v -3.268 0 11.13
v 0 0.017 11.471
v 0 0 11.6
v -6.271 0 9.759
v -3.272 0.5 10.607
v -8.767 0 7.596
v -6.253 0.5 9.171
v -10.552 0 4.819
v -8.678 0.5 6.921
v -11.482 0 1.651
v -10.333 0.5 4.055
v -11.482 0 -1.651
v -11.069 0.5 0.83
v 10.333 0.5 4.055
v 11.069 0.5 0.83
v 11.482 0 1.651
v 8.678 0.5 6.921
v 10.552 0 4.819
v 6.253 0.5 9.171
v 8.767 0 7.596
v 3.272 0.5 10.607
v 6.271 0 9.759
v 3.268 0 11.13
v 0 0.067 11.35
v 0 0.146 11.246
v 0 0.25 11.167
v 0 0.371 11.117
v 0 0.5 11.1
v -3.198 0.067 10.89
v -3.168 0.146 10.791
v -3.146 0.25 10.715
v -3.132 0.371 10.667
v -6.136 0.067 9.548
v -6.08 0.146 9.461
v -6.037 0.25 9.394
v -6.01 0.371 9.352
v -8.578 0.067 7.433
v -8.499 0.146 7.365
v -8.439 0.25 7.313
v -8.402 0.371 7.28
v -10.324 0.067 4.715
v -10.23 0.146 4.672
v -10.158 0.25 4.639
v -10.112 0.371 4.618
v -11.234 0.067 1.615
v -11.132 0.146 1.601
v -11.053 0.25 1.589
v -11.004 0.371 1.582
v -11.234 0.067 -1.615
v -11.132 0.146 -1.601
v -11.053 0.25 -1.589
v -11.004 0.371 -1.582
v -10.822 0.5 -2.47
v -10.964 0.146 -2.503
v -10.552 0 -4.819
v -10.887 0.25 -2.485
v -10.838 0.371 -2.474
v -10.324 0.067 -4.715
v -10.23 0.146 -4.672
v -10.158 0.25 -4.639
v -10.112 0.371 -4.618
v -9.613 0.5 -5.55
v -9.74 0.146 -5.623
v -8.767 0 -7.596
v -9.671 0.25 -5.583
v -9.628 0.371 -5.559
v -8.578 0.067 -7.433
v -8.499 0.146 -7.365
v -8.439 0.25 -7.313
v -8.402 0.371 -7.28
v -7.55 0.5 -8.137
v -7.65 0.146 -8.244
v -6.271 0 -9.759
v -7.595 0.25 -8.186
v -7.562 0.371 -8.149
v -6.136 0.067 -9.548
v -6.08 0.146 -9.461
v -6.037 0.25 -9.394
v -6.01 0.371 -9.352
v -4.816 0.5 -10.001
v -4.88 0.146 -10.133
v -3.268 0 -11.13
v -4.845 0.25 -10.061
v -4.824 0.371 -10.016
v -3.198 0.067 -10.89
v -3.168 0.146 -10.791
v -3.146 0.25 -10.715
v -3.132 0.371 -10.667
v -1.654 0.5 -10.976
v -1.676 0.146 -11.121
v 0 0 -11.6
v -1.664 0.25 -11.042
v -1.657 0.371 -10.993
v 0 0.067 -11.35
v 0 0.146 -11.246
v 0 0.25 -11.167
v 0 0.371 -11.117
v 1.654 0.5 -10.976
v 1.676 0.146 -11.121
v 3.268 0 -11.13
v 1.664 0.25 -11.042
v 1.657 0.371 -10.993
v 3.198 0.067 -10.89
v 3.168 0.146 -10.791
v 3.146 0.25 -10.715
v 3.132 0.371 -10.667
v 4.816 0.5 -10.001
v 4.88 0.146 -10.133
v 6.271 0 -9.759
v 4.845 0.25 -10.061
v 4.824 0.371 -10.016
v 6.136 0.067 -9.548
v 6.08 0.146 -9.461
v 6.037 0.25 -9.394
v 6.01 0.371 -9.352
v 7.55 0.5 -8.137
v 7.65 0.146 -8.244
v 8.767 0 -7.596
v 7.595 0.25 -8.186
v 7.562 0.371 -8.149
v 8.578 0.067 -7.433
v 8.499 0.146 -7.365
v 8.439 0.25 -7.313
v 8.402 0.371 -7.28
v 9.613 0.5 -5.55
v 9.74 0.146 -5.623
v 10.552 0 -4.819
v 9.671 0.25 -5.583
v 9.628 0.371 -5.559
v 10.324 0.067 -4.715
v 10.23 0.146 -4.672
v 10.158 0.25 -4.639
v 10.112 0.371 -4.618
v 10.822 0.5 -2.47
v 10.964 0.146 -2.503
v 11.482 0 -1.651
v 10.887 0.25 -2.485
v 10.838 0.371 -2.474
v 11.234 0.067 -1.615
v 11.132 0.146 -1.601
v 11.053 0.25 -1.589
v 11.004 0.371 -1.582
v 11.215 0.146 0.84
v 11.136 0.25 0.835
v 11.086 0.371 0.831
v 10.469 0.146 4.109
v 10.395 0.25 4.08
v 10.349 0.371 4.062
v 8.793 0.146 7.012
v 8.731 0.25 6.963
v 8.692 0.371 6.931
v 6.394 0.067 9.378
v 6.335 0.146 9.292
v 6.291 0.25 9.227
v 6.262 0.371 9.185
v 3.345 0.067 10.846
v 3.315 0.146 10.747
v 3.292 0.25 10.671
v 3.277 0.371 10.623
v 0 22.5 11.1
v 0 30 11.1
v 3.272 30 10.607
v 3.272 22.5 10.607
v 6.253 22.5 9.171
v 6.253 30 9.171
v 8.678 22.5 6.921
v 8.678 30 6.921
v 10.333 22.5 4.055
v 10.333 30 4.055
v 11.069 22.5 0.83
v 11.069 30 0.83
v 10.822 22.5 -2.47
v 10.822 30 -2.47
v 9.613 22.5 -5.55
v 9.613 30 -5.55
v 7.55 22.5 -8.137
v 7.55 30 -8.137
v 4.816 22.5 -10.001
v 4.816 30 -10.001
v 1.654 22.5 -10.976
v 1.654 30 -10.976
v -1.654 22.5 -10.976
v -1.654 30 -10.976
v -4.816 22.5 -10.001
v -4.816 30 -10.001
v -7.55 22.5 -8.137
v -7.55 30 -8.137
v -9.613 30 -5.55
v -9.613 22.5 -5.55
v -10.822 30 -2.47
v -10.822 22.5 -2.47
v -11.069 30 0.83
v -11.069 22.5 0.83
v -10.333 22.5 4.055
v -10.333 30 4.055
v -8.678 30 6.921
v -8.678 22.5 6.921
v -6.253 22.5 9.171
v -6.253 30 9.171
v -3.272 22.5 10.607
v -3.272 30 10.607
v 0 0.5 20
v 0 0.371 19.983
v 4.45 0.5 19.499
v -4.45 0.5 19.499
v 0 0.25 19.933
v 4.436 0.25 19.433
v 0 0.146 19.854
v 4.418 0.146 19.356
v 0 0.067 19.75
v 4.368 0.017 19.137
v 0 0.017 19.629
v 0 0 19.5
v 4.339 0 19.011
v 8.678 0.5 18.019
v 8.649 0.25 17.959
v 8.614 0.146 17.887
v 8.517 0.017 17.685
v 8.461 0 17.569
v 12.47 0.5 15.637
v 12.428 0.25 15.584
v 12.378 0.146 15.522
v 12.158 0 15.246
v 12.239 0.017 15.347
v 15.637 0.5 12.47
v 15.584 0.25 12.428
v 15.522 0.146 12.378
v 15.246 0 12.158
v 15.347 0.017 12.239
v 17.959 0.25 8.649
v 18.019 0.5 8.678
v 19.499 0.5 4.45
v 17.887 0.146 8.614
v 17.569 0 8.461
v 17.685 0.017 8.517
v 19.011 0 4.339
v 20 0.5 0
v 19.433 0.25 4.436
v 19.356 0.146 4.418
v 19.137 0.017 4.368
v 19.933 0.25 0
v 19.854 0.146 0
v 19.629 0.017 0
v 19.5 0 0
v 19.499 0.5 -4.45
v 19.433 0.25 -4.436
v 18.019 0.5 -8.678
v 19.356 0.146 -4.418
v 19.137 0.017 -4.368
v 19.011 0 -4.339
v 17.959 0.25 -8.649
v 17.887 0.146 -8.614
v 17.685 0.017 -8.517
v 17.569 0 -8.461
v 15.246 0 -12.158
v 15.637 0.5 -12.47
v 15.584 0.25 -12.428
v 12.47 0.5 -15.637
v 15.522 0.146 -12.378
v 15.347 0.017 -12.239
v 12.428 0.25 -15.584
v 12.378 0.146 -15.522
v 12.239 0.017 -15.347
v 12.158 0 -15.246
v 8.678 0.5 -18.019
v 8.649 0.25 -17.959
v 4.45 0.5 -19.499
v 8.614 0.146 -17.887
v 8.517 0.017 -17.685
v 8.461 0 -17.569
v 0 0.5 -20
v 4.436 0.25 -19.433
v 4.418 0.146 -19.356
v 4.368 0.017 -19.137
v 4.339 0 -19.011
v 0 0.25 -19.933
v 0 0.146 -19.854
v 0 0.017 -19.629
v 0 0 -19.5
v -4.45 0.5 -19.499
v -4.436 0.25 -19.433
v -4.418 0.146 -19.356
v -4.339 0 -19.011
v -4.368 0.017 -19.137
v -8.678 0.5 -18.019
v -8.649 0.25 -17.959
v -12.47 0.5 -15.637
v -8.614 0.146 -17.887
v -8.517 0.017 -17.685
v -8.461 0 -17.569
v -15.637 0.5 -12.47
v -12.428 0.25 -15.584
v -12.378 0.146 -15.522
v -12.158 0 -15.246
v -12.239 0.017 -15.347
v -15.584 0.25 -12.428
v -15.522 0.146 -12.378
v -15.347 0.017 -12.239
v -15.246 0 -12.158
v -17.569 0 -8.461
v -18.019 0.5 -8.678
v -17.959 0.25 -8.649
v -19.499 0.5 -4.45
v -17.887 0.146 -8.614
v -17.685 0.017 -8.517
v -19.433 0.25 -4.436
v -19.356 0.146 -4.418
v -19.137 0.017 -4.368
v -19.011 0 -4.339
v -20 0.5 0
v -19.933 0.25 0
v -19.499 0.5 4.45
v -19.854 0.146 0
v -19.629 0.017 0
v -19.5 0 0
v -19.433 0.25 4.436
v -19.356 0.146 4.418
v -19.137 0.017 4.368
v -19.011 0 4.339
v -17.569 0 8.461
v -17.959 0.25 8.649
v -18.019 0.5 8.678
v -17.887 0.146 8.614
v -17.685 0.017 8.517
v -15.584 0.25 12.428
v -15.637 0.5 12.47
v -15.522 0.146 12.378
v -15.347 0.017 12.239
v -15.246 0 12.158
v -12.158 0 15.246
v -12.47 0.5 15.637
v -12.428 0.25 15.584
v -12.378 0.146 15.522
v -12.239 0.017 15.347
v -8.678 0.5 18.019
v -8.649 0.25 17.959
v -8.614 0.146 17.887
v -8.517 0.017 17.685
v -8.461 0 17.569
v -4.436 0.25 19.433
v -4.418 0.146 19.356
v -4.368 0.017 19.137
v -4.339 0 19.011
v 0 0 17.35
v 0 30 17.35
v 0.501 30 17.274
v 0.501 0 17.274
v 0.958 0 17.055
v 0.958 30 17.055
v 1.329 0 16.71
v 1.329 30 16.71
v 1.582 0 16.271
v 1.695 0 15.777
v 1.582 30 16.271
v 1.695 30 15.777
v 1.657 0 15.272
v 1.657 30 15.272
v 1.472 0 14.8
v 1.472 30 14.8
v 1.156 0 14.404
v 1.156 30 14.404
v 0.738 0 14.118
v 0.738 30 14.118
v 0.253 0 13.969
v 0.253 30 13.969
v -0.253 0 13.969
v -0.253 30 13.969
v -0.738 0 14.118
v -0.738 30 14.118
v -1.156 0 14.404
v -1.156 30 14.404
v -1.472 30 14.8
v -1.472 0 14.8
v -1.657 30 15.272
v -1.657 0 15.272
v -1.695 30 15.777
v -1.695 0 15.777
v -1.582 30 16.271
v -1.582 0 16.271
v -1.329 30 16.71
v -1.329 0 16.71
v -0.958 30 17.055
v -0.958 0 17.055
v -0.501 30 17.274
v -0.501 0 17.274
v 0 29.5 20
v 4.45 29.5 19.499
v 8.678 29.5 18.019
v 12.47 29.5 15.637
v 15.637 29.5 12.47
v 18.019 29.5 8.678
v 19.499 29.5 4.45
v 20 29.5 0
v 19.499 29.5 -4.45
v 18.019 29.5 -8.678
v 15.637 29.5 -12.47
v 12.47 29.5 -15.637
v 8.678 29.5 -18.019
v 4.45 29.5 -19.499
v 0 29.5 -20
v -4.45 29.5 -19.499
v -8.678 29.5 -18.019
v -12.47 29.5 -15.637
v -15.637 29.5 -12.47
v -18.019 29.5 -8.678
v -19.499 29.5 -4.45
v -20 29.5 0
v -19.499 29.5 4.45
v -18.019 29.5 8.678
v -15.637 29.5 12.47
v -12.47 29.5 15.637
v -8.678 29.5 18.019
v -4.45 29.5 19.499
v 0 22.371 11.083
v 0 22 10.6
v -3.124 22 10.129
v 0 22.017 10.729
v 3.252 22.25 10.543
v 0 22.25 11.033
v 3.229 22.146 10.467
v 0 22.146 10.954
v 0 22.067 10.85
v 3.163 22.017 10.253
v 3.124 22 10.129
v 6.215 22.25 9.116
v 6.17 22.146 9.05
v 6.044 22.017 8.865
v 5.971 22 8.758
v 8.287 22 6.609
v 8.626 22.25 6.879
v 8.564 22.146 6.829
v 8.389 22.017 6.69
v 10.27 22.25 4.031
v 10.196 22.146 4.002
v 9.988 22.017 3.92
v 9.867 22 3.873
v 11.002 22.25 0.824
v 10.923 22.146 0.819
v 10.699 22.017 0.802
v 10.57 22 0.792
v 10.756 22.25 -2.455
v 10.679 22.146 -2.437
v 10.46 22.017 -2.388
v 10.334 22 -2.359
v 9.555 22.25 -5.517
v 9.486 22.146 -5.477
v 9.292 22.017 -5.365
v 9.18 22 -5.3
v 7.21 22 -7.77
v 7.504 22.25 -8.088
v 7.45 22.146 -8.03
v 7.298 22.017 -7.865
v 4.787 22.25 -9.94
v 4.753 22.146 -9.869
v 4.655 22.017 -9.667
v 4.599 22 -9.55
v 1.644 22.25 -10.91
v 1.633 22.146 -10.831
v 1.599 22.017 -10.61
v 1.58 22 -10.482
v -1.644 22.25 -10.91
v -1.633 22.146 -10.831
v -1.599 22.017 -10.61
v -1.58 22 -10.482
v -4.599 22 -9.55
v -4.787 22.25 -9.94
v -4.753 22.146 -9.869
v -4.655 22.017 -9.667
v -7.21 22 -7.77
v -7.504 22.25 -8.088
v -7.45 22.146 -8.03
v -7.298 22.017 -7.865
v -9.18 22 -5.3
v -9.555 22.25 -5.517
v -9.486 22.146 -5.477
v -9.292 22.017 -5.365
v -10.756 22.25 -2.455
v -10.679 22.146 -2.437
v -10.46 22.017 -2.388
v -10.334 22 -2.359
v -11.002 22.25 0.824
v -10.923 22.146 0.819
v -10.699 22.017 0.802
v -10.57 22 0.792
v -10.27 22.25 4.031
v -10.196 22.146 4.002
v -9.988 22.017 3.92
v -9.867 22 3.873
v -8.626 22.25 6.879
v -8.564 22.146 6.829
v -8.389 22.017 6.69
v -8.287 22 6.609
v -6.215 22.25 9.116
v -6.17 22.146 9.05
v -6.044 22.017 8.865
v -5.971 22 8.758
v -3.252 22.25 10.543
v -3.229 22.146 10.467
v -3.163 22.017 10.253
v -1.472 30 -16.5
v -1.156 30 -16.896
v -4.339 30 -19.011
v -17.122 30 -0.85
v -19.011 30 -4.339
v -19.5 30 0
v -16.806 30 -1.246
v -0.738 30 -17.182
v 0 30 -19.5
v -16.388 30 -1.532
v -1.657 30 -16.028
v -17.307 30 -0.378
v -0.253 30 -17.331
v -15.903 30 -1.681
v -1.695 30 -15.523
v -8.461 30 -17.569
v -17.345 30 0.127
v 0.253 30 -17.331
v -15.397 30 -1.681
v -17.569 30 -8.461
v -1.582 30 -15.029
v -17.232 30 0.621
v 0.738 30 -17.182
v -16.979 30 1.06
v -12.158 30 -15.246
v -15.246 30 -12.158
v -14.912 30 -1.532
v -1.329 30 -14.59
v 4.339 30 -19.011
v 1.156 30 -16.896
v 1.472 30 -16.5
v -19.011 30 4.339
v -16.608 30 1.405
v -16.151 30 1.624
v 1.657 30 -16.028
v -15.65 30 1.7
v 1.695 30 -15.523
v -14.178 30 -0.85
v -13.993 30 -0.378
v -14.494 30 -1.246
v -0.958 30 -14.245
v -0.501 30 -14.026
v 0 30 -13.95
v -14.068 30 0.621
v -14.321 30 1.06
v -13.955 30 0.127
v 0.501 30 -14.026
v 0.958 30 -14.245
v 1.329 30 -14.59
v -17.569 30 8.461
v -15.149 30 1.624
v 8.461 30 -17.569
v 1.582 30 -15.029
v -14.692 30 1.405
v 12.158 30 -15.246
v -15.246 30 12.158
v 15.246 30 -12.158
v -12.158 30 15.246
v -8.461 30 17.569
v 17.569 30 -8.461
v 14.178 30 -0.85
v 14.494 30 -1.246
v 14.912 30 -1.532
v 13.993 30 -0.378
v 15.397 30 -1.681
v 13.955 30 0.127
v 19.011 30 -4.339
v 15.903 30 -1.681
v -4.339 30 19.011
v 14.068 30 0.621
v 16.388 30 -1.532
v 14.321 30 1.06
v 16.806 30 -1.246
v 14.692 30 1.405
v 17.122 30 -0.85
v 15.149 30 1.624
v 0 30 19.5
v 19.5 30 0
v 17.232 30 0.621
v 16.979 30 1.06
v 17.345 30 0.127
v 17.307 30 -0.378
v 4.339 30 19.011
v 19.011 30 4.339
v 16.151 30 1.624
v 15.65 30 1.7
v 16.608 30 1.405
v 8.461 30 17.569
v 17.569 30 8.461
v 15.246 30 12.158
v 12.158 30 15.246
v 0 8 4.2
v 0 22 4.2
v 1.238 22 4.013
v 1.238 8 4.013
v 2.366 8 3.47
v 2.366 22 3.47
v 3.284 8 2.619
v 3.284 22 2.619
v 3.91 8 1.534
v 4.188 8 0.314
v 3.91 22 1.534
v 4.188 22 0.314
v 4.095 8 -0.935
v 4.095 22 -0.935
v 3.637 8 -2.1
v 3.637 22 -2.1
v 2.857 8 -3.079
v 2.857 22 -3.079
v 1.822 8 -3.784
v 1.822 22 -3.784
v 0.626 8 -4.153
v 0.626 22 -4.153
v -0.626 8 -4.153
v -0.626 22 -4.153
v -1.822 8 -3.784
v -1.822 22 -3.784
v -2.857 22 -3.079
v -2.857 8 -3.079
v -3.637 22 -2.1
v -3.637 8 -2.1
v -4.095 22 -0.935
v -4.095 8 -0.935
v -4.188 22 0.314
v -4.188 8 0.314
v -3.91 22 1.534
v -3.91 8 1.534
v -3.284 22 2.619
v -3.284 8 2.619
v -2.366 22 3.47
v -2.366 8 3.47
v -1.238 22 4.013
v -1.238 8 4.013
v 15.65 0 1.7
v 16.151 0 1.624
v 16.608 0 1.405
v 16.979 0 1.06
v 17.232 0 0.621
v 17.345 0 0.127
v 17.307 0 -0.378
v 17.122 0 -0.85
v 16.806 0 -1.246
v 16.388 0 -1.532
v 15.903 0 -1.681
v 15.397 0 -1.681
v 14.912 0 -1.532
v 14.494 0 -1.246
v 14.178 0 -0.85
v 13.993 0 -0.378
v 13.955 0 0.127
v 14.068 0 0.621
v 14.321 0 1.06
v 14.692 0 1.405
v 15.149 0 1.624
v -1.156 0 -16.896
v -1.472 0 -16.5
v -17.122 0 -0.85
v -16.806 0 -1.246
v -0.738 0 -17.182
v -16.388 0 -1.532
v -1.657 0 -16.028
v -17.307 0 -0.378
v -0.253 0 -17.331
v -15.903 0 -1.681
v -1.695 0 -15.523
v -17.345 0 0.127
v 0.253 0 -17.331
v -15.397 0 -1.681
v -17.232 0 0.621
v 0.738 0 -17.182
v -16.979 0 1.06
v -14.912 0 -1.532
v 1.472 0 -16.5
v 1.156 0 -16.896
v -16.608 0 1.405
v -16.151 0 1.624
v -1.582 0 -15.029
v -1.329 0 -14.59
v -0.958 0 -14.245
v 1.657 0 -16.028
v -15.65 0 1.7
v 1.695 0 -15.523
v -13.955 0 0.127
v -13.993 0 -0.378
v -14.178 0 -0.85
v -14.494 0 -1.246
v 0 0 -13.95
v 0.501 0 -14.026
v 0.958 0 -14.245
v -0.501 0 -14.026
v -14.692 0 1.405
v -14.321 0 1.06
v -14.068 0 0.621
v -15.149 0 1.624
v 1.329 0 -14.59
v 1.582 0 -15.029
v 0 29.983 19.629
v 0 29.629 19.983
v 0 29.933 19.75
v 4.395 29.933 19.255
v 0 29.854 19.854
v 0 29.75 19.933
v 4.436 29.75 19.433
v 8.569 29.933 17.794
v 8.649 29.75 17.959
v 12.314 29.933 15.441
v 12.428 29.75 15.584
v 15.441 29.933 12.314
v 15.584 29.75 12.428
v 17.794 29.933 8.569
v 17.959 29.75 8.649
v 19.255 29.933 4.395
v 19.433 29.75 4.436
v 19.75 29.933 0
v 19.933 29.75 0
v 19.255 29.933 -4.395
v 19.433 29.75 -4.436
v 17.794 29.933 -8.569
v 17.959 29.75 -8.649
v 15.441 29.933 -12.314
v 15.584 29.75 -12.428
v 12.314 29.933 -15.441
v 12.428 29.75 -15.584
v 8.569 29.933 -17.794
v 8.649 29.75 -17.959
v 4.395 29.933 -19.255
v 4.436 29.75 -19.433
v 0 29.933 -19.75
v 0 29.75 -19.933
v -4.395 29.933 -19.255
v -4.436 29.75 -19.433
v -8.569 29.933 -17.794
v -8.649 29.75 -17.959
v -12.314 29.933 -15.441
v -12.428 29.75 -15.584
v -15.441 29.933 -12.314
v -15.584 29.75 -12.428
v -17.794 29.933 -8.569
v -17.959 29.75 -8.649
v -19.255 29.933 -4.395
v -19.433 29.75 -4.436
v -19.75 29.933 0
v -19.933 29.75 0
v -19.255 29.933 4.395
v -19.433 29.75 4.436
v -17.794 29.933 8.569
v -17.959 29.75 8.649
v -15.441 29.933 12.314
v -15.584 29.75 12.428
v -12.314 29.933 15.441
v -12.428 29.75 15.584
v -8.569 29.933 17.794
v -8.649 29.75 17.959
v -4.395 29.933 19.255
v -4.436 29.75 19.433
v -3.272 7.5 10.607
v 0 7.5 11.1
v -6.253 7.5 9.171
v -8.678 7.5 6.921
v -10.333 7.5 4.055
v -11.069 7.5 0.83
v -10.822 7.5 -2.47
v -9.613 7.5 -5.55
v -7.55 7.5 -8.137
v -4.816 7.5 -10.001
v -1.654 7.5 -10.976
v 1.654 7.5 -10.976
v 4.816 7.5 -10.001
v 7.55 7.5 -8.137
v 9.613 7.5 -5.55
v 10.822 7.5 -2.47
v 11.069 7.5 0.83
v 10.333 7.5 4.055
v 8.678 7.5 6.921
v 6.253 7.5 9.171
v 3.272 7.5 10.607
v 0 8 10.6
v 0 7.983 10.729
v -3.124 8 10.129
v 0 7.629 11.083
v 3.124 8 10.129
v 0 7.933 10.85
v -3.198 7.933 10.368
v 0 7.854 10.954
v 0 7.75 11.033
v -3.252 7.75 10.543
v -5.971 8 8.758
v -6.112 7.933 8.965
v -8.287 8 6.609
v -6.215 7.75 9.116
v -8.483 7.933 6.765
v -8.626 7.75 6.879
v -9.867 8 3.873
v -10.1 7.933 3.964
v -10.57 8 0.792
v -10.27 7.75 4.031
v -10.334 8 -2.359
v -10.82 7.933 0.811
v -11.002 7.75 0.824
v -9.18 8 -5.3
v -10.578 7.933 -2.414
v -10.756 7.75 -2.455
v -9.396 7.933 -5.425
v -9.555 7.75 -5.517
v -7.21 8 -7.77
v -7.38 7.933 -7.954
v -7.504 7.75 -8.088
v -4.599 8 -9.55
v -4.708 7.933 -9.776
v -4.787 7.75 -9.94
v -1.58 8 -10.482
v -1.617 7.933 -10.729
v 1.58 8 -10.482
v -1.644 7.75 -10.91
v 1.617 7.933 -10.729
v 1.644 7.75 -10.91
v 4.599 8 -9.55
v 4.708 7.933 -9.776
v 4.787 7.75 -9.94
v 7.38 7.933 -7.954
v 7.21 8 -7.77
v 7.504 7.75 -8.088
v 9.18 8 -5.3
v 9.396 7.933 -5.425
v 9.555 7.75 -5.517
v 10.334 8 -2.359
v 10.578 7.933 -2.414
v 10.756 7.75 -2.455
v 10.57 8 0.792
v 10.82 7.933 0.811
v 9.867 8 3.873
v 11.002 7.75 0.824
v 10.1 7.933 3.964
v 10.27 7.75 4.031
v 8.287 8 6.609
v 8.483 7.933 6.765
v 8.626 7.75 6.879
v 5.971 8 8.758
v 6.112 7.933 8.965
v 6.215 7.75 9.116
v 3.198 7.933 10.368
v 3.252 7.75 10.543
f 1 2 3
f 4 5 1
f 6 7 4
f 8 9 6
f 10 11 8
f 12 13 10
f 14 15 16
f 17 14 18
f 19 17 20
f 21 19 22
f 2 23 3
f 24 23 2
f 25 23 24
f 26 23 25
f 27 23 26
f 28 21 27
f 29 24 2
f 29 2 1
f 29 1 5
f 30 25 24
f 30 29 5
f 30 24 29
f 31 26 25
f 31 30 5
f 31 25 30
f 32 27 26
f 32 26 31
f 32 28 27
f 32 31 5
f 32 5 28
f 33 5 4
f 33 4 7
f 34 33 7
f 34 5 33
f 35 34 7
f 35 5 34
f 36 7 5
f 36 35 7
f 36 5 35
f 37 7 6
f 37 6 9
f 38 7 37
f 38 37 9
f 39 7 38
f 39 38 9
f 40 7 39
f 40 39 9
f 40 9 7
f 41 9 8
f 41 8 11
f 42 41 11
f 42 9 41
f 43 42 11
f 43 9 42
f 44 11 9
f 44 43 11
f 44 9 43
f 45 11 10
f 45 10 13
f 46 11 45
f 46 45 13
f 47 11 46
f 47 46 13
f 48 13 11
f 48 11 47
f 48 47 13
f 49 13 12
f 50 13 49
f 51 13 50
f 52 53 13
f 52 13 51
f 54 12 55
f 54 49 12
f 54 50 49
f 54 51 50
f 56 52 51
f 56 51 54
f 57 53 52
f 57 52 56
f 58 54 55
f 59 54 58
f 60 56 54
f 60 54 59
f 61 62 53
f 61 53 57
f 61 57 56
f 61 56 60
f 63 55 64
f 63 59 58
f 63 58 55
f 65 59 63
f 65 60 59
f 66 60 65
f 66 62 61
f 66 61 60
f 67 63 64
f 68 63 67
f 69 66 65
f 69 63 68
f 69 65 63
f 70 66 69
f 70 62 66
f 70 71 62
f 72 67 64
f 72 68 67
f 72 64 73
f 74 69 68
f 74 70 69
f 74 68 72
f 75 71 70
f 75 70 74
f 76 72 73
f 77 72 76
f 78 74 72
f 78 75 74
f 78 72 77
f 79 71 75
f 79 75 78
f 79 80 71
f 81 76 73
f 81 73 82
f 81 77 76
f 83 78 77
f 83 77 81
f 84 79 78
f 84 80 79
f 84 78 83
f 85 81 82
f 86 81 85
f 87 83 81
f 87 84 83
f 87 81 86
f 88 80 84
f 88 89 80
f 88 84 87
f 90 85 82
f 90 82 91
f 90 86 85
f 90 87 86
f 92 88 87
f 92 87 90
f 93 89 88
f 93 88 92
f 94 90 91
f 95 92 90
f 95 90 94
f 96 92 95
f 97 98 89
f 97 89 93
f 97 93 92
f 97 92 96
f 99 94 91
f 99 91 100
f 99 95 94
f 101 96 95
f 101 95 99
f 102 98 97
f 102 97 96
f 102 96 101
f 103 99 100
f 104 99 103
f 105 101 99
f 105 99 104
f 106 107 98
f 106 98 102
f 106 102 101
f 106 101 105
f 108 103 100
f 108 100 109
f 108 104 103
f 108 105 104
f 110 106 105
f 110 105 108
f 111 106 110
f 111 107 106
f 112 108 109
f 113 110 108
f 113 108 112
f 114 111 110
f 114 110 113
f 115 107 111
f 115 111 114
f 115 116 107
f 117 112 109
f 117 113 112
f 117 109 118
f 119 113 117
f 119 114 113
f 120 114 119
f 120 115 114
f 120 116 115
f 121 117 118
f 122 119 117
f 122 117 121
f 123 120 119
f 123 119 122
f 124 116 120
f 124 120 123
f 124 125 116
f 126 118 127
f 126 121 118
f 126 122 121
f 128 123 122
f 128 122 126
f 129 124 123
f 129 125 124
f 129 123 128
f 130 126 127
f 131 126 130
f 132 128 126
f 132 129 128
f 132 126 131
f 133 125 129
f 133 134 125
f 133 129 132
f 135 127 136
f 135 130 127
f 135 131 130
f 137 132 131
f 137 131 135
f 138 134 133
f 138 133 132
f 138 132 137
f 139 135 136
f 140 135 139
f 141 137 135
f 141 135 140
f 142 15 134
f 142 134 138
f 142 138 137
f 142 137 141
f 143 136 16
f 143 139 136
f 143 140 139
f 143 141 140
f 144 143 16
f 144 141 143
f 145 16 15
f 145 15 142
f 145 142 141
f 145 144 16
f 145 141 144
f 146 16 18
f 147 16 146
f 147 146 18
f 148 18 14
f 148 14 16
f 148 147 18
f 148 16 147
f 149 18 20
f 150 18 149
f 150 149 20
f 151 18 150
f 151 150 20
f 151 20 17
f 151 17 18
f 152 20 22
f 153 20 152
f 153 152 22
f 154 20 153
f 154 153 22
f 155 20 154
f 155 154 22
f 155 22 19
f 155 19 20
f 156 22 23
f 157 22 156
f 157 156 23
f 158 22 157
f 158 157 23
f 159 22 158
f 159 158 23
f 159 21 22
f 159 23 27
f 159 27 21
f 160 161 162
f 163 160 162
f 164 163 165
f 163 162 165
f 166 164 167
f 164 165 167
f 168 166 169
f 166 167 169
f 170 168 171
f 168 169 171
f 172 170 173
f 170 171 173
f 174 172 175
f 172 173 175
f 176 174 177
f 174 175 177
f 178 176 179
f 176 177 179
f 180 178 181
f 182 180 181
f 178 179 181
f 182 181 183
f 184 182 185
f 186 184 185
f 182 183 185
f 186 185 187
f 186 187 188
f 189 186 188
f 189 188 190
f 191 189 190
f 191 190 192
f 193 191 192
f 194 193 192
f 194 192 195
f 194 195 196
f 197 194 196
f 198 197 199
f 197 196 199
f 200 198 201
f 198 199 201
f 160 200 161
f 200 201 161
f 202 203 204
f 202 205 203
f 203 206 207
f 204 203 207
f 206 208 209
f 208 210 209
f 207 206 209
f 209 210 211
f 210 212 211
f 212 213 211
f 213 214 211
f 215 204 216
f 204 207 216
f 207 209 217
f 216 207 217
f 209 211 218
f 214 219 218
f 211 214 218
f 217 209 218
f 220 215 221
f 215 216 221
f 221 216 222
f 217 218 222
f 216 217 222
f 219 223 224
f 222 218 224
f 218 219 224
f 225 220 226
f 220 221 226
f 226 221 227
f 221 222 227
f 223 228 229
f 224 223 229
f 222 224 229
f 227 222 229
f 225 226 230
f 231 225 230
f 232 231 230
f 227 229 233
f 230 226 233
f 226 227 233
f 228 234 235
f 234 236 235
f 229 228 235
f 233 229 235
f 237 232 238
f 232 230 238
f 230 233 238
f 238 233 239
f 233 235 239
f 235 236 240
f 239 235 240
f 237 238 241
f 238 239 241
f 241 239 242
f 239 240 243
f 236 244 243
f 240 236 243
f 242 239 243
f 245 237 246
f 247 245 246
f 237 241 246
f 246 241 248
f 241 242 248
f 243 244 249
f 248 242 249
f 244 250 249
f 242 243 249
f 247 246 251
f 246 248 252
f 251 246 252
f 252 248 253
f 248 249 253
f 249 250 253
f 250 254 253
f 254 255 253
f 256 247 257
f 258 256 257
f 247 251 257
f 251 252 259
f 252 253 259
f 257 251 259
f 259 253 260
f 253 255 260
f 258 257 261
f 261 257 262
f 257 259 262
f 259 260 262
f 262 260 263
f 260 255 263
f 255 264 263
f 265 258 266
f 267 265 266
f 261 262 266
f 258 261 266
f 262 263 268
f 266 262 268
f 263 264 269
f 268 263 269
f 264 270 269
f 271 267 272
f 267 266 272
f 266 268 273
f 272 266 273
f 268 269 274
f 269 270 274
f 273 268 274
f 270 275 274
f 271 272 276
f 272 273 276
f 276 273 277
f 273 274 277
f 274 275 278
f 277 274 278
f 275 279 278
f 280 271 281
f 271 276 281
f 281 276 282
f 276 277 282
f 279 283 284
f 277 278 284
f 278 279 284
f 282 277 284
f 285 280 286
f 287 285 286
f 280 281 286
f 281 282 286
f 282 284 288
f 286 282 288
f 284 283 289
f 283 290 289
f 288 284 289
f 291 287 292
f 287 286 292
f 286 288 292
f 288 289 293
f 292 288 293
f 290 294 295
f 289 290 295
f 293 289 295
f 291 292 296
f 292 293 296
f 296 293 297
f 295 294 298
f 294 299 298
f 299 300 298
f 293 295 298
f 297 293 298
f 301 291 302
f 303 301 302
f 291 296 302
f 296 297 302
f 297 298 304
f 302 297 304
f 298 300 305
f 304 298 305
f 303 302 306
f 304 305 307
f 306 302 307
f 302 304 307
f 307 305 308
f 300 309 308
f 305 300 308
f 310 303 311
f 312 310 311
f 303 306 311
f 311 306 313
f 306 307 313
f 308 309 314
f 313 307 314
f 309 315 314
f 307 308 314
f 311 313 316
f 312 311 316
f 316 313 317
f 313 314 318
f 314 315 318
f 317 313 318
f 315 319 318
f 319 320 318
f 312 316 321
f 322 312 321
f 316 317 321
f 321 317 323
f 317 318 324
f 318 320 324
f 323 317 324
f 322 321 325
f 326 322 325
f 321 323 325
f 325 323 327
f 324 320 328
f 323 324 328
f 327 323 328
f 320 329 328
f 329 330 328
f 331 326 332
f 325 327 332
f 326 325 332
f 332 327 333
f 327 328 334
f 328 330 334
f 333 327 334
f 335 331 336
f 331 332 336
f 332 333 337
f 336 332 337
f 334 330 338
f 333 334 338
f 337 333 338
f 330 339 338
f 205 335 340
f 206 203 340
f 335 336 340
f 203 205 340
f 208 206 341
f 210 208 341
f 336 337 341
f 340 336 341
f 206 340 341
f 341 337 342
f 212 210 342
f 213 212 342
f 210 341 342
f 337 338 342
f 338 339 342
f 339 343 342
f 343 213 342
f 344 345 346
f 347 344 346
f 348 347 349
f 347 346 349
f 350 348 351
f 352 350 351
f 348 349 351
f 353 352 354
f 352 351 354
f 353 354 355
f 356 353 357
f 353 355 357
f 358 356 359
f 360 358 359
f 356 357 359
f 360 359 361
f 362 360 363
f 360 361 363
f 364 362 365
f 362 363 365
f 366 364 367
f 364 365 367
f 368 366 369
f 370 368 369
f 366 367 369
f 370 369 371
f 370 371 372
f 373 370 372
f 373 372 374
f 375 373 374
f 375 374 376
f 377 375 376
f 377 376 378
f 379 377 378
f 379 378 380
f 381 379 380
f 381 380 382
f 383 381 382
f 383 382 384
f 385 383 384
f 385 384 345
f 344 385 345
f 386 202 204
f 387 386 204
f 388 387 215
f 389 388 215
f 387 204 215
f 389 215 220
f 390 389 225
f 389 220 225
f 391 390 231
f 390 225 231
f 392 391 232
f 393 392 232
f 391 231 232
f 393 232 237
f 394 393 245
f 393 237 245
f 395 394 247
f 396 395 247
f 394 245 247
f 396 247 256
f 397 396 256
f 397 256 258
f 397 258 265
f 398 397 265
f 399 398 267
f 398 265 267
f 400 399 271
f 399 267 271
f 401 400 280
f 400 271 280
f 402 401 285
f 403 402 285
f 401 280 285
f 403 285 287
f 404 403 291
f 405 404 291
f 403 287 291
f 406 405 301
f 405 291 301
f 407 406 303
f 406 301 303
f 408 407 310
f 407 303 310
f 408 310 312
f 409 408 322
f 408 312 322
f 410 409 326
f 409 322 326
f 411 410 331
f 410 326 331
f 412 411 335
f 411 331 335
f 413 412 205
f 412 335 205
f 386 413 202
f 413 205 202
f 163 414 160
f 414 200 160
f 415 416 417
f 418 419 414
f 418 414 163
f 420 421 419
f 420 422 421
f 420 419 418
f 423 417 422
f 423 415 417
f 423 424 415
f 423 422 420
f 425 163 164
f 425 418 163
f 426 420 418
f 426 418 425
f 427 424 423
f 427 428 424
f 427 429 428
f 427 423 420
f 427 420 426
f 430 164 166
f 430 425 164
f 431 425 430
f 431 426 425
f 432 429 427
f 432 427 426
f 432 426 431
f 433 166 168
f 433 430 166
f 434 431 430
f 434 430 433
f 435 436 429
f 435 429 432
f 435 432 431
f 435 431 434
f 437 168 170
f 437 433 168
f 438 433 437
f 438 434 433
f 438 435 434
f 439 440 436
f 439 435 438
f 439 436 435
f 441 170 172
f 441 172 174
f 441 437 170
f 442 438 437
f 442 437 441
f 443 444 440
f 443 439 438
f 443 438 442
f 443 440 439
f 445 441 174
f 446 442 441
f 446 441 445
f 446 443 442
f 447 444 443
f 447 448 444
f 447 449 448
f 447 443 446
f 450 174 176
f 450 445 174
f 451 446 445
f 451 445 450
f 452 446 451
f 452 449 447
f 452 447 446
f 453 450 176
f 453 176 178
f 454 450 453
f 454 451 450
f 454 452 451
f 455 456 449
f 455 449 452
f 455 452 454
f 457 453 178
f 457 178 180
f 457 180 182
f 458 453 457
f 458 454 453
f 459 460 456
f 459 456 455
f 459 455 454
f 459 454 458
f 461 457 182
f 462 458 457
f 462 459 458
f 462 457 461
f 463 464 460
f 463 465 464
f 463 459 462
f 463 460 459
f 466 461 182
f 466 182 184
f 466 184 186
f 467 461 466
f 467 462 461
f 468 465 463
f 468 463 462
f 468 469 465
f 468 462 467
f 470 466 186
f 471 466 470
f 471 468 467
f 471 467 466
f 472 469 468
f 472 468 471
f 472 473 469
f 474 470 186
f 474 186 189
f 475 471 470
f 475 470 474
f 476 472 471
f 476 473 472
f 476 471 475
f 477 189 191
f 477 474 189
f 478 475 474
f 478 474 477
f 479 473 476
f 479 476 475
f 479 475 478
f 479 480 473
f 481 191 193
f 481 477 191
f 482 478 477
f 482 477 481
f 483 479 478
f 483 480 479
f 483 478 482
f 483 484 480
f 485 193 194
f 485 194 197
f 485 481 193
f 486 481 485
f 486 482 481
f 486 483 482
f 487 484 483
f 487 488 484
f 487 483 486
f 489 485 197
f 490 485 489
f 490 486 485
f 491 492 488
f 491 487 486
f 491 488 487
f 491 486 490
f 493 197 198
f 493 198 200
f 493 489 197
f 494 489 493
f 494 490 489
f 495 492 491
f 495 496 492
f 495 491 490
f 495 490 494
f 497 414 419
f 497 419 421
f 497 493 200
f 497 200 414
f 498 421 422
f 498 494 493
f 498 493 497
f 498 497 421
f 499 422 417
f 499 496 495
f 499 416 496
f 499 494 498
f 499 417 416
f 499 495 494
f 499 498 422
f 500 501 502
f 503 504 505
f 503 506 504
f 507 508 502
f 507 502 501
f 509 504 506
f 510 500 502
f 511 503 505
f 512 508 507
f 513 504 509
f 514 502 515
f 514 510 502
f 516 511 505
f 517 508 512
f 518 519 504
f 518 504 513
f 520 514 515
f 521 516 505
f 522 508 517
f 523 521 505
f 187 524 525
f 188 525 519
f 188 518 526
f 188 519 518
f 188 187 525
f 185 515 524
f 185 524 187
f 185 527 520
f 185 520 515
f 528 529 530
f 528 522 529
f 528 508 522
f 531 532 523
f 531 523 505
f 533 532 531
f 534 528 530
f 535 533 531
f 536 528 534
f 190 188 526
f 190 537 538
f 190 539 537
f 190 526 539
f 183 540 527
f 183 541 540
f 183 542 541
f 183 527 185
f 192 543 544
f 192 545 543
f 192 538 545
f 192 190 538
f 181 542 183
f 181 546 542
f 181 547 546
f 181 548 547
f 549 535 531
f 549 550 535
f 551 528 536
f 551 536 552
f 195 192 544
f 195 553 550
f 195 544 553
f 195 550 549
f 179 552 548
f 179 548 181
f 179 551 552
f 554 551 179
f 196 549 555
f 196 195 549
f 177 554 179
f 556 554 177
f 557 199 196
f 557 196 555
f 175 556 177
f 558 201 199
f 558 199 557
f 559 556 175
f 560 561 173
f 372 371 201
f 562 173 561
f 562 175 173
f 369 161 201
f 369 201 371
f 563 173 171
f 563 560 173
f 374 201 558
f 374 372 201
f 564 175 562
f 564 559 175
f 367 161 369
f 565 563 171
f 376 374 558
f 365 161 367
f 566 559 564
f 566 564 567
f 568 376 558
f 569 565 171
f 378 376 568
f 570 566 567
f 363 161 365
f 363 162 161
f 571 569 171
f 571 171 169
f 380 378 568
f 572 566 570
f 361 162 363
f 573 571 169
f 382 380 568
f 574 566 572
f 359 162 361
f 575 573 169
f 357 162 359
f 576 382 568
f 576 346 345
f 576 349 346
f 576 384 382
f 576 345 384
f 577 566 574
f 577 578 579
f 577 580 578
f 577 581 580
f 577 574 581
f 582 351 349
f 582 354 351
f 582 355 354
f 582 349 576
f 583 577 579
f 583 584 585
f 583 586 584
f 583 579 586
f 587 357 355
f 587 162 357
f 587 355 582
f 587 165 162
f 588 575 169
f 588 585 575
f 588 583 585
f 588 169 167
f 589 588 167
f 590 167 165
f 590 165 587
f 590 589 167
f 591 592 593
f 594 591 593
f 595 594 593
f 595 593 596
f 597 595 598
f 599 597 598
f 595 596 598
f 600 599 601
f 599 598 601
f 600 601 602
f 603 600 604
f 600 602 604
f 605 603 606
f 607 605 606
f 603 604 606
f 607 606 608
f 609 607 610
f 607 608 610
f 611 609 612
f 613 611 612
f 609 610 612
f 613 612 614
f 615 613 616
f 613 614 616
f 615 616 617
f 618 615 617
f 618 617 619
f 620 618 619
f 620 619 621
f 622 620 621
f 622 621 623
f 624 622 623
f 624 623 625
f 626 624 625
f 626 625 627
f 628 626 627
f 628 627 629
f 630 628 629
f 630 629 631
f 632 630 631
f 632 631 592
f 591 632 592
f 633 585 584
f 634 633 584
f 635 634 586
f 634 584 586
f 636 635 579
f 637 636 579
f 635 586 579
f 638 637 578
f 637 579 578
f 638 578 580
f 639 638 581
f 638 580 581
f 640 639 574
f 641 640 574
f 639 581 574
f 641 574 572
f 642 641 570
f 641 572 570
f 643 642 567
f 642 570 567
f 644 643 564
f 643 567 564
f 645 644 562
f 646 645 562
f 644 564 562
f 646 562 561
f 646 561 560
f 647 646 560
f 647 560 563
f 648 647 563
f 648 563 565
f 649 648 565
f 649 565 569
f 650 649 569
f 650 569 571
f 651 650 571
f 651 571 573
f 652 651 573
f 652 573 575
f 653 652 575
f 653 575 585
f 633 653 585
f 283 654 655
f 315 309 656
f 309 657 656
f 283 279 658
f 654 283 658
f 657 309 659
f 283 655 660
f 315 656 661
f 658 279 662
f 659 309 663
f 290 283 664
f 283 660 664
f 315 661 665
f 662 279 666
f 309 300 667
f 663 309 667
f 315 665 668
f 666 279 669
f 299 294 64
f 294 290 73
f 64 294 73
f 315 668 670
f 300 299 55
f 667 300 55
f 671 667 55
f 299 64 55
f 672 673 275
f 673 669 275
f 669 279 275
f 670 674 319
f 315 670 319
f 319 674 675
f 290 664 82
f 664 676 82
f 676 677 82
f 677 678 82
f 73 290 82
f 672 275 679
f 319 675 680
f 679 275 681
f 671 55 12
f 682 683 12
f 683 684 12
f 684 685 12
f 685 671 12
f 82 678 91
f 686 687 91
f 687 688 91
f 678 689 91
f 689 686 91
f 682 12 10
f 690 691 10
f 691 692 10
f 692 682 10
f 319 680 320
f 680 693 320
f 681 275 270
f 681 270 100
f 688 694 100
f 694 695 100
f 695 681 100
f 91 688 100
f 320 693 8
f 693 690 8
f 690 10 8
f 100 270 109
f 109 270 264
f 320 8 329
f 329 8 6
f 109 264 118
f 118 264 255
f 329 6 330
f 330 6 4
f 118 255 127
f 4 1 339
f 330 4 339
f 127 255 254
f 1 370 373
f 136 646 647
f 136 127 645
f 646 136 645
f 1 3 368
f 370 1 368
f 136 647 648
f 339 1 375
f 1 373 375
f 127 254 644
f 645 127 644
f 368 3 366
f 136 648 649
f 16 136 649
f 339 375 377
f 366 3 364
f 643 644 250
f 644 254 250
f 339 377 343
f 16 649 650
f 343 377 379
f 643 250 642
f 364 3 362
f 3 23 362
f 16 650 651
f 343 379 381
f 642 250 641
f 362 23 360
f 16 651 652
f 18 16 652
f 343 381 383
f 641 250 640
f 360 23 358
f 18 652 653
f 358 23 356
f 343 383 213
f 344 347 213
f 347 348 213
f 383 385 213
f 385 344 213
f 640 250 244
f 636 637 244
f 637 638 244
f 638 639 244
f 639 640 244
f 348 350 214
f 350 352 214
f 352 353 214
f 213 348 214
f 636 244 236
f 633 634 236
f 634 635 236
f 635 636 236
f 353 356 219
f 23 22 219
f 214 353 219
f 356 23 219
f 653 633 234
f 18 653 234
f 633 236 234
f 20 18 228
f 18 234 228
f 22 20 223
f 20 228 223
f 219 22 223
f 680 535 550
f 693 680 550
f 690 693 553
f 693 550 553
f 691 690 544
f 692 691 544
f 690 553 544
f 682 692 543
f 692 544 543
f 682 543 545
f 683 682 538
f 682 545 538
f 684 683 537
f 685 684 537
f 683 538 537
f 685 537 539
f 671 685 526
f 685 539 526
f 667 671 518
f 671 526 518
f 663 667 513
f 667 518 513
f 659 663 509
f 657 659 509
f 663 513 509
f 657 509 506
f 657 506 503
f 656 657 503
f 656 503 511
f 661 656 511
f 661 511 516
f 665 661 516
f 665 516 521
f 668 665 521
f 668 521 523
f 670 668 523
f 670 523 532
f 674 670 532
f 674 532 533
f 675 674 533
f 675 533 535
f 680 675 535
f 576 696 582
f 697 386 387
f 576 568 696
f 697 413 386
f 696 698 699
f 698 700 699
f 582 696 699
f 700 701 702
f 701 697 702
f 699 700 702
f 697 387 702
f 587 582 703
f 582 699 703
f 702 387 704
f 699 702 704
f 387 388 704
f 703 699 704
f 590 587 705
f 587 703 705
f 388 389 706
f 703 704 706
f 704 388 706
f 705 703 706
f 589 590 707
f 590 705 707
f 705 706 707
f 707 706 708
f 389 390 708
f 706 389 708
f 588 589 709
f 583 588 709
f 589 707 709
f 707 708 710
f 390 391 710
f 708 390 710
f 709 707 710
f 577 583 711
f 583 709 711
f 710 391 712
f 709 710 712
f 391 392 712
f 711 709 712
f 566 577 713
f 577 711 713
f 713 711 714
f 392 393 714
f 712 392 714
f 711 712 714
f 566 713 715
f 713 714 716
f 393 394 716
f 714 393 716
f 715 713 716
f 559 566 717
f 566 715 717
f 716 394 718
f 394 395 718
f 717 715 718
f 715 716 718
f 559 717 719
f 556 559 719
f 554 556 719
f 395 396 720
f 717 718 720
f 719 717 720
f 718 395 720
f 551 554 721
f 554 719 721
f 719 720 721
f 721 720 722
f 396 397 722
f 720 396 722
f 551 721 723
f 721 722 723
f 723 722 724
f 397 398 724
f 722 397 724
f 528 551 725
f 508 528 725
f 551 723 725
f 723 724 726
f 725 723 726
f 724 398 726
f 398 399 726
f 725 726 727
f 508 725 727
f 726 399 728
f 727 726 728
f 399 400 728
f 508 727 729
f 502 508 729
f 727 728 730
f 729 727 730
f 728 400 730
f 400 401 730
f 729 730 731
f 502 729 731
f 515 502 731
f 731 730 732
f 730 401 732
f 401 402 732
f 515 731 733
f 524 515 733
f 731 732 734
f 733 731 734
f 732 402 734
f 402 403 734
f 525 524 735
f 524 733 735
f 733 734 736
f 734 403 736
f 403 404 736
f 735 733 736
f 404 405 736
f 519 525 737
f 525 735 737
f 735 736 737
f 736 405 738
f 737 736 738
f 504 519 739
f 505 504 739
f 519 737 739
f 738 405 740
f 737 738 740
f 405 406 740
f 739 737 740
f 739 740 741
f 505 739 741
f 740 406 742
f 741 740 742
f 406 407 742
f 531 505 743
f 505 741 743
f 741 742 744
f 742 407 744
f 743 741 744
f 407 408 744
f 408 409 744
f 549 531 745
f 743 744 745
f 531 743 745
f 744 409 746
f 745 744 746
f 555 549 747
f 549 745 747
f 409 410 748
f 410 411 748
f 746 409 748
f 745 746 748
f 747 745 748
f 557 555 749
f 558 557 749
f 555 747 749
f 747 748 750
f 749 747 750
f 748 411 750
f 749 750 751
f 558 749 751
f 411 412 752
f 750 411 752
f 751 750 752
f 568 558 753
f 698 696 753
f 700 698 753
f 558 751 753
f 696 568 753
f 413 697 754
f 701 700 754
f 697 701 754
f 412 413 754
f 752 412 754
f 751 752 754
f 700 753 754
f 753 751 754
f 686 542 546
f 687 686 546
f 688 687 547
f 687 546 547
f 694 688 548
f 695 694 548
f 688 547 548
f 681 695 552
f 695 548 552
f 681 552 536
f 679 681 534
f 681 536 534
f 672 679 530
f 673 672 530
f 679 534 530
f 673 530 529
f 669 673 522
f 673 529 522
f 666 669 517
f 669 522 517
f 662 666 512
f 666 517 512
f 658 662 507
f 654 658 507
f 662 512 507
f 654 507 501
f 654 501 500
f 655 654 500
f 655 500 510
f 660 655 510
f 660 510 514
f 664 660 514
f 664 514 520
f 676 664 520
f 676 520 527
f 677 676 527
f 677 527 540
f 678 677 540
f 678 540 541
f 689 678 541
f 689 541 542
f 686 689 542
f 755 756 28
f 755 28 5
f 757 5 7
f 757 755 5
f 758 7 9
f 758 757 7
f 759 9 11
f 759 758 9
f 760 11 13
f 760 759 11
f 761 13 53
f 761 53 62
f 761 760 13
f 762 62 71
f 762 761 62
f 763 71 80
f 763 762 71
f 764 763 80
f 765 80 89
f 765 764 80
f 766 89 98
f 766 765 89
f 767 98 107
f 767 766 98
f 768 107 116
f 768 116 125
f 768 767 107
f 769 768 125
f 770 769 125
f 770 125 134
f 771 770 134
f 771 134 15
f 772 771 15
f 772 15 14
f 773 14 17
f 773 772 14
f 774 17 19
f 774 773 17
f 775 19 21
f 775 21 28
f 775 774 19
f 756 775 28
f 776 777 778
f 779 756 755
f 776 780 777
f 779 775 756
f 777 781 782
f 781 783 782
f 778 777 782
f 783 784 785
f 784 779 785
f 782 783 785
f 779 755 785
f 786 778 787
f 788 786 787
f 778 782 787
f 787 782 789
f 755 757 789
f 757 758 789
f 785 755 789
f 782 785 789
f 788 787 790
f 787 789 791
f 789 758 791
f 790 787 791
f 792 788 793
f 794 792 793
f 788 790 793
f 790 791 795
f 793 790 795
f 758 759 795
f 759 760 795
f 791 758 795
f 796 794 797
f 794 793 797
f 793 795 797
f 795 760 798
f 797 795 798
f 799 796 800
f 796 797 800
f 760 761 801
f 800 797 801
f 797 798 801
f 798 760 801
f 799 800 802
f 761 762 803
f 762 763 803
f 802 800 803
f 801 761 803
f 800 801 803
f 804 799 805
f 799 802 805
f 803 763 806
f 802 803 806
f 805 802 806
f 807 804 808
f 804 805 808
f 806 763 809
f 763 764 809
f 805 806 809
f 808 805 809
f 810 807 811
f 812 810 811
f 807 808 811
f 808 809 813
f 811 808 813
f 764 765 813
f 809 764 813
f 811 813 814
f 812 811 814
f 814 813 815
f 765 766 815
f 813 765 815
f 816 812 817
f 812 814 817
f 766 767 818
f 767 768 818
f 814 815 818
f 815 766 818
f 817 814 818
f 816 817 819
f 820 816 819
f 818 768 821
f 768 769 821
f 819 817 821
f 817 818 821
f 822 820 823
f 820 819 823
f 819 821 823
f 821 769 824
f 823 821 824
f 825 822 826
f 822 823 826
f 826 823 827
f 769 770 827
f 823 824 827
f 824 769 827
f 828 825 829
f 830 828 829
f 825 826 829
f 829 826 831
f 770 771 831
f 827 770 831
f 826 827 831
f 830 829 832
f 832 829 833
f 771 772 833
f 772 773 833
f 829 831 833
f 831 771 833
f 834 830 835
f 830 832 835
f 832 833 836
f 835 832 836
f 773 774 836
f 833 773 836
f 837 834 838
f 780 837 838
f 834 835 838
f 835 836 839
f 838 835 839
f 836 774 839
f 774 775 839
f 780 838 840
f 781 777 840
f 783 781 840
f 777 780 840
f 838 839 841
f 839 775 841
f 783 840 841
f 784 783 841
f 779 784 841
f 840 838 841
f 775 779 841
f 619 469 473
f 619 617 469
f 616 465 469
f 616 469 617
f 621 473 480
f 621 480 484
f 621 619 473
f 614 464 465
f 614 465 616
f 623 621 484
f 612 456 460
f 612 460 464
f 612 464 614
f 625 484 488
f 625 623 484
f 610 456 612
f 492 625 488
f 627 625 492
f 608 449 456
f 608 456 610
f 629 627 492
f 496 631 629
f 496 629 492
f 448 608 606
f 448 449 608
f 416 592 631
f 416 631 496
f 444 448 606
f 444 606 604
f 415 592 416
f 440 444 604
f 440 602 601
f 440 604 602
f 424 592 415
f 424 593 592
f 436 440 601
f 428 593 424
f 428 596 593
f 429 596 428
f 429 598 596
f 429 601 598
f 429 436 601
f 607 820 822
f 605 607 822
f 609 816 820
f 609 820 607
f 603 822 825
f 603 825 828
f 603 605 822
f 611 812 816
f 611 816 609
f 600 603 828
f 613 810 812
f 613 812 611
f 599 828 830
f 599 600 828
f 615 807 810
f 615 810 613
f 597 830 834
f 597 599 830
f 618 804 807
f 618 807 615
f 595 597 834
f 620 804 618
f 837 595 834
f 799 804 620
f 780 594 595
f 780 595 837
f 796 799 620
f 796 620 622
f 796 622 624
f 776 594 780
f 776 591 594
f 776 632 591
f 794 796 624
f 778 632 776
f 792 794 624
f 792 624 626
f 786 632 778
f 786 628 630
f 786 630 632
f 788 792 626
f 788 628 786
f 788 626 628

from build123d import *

# Parameters (mm, degrees)
SKETCH2_R           = 20
BOSS_EXTRUDE1_DEPTH = 30
SKETCH3_R           = 11.1
CUT_EXTRUDE1_DEPTH  = 8
CUT_EXTRUDE2_START  = -8
SKETCH4_R           = 11.1
CUT_EXTRUDE2_DEPTH  = 8
SKETCH5_R           = 1.7
CUT_EXTRUDE3_DEPTH  = 42.231056256
SKETCH6_R           = 4.2
CUT_EXTRUDE4_DEPTH  = 36.832945734
FILLET1_R           = 0.5
FILLET2_R           = 0.5


with BuildPart() as part:
    # Sketch2 → Boss-Extrude1 (new body)
    with BuildSketch(Plane(origin=(0, 0, 0), x_dir=(1, 0, 0), z_dir=(0, 1, 0))):
        with Locations(Location((0, 0, 0), (0, 0, 270))):
            Circle(SKETCH2_R)
    extrude(amount=BOSS_EXTRUDE1_DEPTH)

    # Sketch3 → Cut-Extrude1 (cut)
    with BuildSketch(Plane(origin=(0, 30, 0), x_dir=(1, 0, 0), z_dir=(0, 1, 0))):
        with Locations(Location((0, 0, 0), (0, 0, 270))):
            Circle(SKETCH3_R)
    extrude(amount=-CUT_EXTRUDE1_DEPTH, mode=Mode.SUBTRACT)

    # Sketch4 → Cut-Extrude2 (cut)
    with BuildSketch(Plane(origin=(0, 0, 0), x_dir=(-1, 0, 0), z_dir=(0, -1, 0)).offset(CUT_EXTRUDE2_START)):
        with Locations(Location((0, 0, 0), (0, 0, 270))):
            Circle(SKETCH4_R)
    extrude(amount=CUT_EXTRUDE2_DEPTH, mode=Mode.SUBTRACT)

    # Sketch5 → Cut-Extrude3 (cut, through all)
    with BuildSketch(Plane(origin=(0, 30, 0), x_dir=(1, 0, 0), z_dir=(0, 1, 0))):
        with Locations(Location((0, 15.65, 0), (0, 0, 270))):
            Circle(SKETCH5_R)
        with Locations(Location((-15.65, 0, 0), (0, 0, 270))):
            Circle(SKETCH5_R)
        with Locations(Location((0, -15.65, 0), (0, 0, 270))):
            Circle(SKETCH5_R)
        with Locations(Location((15.65, 0, 0), (0, 0, 270))):
            Circle(SKETCH5_R)
    extrude(amount=-CUT_EXTRUDE3_DEPTH, mode=Mode.SUBTRACT)

    # Sketch6 → Cut-Extrude4 (cut, through all)
    with BuildSketch(Plane(origin=(0, 22, 0), x_dir=(1, 0, 0), z_dir=(0, 1, 0))):
        with Locations(Location((0, 0, 0), (0, 0, 270))):
            Circle(SKETCH6_R)
    extrude(amount=-CUT_EXTRUDE4_DEPTH, mode=Mode.SUBTRACT)

    # Fillet1
    fillet1_edges = [part.edges().sort_by_distance(p)[0] for p in [
        (0, 22, -11.1),
    ]]
    fillet(fillet1_edges, radius=FILLET1_R)

    # Fillet2
    fillet2_edges = [part.edges().sort_by_distance(p)[0] for p in [
        (0, 8, -11.1),
        (0, 0, -11.1),
        (0, 0, -20),
        (0, 30, -20),
    ]]
    fillet(fillet2_edges, radius=FILLET2_R)


solid = part.part
